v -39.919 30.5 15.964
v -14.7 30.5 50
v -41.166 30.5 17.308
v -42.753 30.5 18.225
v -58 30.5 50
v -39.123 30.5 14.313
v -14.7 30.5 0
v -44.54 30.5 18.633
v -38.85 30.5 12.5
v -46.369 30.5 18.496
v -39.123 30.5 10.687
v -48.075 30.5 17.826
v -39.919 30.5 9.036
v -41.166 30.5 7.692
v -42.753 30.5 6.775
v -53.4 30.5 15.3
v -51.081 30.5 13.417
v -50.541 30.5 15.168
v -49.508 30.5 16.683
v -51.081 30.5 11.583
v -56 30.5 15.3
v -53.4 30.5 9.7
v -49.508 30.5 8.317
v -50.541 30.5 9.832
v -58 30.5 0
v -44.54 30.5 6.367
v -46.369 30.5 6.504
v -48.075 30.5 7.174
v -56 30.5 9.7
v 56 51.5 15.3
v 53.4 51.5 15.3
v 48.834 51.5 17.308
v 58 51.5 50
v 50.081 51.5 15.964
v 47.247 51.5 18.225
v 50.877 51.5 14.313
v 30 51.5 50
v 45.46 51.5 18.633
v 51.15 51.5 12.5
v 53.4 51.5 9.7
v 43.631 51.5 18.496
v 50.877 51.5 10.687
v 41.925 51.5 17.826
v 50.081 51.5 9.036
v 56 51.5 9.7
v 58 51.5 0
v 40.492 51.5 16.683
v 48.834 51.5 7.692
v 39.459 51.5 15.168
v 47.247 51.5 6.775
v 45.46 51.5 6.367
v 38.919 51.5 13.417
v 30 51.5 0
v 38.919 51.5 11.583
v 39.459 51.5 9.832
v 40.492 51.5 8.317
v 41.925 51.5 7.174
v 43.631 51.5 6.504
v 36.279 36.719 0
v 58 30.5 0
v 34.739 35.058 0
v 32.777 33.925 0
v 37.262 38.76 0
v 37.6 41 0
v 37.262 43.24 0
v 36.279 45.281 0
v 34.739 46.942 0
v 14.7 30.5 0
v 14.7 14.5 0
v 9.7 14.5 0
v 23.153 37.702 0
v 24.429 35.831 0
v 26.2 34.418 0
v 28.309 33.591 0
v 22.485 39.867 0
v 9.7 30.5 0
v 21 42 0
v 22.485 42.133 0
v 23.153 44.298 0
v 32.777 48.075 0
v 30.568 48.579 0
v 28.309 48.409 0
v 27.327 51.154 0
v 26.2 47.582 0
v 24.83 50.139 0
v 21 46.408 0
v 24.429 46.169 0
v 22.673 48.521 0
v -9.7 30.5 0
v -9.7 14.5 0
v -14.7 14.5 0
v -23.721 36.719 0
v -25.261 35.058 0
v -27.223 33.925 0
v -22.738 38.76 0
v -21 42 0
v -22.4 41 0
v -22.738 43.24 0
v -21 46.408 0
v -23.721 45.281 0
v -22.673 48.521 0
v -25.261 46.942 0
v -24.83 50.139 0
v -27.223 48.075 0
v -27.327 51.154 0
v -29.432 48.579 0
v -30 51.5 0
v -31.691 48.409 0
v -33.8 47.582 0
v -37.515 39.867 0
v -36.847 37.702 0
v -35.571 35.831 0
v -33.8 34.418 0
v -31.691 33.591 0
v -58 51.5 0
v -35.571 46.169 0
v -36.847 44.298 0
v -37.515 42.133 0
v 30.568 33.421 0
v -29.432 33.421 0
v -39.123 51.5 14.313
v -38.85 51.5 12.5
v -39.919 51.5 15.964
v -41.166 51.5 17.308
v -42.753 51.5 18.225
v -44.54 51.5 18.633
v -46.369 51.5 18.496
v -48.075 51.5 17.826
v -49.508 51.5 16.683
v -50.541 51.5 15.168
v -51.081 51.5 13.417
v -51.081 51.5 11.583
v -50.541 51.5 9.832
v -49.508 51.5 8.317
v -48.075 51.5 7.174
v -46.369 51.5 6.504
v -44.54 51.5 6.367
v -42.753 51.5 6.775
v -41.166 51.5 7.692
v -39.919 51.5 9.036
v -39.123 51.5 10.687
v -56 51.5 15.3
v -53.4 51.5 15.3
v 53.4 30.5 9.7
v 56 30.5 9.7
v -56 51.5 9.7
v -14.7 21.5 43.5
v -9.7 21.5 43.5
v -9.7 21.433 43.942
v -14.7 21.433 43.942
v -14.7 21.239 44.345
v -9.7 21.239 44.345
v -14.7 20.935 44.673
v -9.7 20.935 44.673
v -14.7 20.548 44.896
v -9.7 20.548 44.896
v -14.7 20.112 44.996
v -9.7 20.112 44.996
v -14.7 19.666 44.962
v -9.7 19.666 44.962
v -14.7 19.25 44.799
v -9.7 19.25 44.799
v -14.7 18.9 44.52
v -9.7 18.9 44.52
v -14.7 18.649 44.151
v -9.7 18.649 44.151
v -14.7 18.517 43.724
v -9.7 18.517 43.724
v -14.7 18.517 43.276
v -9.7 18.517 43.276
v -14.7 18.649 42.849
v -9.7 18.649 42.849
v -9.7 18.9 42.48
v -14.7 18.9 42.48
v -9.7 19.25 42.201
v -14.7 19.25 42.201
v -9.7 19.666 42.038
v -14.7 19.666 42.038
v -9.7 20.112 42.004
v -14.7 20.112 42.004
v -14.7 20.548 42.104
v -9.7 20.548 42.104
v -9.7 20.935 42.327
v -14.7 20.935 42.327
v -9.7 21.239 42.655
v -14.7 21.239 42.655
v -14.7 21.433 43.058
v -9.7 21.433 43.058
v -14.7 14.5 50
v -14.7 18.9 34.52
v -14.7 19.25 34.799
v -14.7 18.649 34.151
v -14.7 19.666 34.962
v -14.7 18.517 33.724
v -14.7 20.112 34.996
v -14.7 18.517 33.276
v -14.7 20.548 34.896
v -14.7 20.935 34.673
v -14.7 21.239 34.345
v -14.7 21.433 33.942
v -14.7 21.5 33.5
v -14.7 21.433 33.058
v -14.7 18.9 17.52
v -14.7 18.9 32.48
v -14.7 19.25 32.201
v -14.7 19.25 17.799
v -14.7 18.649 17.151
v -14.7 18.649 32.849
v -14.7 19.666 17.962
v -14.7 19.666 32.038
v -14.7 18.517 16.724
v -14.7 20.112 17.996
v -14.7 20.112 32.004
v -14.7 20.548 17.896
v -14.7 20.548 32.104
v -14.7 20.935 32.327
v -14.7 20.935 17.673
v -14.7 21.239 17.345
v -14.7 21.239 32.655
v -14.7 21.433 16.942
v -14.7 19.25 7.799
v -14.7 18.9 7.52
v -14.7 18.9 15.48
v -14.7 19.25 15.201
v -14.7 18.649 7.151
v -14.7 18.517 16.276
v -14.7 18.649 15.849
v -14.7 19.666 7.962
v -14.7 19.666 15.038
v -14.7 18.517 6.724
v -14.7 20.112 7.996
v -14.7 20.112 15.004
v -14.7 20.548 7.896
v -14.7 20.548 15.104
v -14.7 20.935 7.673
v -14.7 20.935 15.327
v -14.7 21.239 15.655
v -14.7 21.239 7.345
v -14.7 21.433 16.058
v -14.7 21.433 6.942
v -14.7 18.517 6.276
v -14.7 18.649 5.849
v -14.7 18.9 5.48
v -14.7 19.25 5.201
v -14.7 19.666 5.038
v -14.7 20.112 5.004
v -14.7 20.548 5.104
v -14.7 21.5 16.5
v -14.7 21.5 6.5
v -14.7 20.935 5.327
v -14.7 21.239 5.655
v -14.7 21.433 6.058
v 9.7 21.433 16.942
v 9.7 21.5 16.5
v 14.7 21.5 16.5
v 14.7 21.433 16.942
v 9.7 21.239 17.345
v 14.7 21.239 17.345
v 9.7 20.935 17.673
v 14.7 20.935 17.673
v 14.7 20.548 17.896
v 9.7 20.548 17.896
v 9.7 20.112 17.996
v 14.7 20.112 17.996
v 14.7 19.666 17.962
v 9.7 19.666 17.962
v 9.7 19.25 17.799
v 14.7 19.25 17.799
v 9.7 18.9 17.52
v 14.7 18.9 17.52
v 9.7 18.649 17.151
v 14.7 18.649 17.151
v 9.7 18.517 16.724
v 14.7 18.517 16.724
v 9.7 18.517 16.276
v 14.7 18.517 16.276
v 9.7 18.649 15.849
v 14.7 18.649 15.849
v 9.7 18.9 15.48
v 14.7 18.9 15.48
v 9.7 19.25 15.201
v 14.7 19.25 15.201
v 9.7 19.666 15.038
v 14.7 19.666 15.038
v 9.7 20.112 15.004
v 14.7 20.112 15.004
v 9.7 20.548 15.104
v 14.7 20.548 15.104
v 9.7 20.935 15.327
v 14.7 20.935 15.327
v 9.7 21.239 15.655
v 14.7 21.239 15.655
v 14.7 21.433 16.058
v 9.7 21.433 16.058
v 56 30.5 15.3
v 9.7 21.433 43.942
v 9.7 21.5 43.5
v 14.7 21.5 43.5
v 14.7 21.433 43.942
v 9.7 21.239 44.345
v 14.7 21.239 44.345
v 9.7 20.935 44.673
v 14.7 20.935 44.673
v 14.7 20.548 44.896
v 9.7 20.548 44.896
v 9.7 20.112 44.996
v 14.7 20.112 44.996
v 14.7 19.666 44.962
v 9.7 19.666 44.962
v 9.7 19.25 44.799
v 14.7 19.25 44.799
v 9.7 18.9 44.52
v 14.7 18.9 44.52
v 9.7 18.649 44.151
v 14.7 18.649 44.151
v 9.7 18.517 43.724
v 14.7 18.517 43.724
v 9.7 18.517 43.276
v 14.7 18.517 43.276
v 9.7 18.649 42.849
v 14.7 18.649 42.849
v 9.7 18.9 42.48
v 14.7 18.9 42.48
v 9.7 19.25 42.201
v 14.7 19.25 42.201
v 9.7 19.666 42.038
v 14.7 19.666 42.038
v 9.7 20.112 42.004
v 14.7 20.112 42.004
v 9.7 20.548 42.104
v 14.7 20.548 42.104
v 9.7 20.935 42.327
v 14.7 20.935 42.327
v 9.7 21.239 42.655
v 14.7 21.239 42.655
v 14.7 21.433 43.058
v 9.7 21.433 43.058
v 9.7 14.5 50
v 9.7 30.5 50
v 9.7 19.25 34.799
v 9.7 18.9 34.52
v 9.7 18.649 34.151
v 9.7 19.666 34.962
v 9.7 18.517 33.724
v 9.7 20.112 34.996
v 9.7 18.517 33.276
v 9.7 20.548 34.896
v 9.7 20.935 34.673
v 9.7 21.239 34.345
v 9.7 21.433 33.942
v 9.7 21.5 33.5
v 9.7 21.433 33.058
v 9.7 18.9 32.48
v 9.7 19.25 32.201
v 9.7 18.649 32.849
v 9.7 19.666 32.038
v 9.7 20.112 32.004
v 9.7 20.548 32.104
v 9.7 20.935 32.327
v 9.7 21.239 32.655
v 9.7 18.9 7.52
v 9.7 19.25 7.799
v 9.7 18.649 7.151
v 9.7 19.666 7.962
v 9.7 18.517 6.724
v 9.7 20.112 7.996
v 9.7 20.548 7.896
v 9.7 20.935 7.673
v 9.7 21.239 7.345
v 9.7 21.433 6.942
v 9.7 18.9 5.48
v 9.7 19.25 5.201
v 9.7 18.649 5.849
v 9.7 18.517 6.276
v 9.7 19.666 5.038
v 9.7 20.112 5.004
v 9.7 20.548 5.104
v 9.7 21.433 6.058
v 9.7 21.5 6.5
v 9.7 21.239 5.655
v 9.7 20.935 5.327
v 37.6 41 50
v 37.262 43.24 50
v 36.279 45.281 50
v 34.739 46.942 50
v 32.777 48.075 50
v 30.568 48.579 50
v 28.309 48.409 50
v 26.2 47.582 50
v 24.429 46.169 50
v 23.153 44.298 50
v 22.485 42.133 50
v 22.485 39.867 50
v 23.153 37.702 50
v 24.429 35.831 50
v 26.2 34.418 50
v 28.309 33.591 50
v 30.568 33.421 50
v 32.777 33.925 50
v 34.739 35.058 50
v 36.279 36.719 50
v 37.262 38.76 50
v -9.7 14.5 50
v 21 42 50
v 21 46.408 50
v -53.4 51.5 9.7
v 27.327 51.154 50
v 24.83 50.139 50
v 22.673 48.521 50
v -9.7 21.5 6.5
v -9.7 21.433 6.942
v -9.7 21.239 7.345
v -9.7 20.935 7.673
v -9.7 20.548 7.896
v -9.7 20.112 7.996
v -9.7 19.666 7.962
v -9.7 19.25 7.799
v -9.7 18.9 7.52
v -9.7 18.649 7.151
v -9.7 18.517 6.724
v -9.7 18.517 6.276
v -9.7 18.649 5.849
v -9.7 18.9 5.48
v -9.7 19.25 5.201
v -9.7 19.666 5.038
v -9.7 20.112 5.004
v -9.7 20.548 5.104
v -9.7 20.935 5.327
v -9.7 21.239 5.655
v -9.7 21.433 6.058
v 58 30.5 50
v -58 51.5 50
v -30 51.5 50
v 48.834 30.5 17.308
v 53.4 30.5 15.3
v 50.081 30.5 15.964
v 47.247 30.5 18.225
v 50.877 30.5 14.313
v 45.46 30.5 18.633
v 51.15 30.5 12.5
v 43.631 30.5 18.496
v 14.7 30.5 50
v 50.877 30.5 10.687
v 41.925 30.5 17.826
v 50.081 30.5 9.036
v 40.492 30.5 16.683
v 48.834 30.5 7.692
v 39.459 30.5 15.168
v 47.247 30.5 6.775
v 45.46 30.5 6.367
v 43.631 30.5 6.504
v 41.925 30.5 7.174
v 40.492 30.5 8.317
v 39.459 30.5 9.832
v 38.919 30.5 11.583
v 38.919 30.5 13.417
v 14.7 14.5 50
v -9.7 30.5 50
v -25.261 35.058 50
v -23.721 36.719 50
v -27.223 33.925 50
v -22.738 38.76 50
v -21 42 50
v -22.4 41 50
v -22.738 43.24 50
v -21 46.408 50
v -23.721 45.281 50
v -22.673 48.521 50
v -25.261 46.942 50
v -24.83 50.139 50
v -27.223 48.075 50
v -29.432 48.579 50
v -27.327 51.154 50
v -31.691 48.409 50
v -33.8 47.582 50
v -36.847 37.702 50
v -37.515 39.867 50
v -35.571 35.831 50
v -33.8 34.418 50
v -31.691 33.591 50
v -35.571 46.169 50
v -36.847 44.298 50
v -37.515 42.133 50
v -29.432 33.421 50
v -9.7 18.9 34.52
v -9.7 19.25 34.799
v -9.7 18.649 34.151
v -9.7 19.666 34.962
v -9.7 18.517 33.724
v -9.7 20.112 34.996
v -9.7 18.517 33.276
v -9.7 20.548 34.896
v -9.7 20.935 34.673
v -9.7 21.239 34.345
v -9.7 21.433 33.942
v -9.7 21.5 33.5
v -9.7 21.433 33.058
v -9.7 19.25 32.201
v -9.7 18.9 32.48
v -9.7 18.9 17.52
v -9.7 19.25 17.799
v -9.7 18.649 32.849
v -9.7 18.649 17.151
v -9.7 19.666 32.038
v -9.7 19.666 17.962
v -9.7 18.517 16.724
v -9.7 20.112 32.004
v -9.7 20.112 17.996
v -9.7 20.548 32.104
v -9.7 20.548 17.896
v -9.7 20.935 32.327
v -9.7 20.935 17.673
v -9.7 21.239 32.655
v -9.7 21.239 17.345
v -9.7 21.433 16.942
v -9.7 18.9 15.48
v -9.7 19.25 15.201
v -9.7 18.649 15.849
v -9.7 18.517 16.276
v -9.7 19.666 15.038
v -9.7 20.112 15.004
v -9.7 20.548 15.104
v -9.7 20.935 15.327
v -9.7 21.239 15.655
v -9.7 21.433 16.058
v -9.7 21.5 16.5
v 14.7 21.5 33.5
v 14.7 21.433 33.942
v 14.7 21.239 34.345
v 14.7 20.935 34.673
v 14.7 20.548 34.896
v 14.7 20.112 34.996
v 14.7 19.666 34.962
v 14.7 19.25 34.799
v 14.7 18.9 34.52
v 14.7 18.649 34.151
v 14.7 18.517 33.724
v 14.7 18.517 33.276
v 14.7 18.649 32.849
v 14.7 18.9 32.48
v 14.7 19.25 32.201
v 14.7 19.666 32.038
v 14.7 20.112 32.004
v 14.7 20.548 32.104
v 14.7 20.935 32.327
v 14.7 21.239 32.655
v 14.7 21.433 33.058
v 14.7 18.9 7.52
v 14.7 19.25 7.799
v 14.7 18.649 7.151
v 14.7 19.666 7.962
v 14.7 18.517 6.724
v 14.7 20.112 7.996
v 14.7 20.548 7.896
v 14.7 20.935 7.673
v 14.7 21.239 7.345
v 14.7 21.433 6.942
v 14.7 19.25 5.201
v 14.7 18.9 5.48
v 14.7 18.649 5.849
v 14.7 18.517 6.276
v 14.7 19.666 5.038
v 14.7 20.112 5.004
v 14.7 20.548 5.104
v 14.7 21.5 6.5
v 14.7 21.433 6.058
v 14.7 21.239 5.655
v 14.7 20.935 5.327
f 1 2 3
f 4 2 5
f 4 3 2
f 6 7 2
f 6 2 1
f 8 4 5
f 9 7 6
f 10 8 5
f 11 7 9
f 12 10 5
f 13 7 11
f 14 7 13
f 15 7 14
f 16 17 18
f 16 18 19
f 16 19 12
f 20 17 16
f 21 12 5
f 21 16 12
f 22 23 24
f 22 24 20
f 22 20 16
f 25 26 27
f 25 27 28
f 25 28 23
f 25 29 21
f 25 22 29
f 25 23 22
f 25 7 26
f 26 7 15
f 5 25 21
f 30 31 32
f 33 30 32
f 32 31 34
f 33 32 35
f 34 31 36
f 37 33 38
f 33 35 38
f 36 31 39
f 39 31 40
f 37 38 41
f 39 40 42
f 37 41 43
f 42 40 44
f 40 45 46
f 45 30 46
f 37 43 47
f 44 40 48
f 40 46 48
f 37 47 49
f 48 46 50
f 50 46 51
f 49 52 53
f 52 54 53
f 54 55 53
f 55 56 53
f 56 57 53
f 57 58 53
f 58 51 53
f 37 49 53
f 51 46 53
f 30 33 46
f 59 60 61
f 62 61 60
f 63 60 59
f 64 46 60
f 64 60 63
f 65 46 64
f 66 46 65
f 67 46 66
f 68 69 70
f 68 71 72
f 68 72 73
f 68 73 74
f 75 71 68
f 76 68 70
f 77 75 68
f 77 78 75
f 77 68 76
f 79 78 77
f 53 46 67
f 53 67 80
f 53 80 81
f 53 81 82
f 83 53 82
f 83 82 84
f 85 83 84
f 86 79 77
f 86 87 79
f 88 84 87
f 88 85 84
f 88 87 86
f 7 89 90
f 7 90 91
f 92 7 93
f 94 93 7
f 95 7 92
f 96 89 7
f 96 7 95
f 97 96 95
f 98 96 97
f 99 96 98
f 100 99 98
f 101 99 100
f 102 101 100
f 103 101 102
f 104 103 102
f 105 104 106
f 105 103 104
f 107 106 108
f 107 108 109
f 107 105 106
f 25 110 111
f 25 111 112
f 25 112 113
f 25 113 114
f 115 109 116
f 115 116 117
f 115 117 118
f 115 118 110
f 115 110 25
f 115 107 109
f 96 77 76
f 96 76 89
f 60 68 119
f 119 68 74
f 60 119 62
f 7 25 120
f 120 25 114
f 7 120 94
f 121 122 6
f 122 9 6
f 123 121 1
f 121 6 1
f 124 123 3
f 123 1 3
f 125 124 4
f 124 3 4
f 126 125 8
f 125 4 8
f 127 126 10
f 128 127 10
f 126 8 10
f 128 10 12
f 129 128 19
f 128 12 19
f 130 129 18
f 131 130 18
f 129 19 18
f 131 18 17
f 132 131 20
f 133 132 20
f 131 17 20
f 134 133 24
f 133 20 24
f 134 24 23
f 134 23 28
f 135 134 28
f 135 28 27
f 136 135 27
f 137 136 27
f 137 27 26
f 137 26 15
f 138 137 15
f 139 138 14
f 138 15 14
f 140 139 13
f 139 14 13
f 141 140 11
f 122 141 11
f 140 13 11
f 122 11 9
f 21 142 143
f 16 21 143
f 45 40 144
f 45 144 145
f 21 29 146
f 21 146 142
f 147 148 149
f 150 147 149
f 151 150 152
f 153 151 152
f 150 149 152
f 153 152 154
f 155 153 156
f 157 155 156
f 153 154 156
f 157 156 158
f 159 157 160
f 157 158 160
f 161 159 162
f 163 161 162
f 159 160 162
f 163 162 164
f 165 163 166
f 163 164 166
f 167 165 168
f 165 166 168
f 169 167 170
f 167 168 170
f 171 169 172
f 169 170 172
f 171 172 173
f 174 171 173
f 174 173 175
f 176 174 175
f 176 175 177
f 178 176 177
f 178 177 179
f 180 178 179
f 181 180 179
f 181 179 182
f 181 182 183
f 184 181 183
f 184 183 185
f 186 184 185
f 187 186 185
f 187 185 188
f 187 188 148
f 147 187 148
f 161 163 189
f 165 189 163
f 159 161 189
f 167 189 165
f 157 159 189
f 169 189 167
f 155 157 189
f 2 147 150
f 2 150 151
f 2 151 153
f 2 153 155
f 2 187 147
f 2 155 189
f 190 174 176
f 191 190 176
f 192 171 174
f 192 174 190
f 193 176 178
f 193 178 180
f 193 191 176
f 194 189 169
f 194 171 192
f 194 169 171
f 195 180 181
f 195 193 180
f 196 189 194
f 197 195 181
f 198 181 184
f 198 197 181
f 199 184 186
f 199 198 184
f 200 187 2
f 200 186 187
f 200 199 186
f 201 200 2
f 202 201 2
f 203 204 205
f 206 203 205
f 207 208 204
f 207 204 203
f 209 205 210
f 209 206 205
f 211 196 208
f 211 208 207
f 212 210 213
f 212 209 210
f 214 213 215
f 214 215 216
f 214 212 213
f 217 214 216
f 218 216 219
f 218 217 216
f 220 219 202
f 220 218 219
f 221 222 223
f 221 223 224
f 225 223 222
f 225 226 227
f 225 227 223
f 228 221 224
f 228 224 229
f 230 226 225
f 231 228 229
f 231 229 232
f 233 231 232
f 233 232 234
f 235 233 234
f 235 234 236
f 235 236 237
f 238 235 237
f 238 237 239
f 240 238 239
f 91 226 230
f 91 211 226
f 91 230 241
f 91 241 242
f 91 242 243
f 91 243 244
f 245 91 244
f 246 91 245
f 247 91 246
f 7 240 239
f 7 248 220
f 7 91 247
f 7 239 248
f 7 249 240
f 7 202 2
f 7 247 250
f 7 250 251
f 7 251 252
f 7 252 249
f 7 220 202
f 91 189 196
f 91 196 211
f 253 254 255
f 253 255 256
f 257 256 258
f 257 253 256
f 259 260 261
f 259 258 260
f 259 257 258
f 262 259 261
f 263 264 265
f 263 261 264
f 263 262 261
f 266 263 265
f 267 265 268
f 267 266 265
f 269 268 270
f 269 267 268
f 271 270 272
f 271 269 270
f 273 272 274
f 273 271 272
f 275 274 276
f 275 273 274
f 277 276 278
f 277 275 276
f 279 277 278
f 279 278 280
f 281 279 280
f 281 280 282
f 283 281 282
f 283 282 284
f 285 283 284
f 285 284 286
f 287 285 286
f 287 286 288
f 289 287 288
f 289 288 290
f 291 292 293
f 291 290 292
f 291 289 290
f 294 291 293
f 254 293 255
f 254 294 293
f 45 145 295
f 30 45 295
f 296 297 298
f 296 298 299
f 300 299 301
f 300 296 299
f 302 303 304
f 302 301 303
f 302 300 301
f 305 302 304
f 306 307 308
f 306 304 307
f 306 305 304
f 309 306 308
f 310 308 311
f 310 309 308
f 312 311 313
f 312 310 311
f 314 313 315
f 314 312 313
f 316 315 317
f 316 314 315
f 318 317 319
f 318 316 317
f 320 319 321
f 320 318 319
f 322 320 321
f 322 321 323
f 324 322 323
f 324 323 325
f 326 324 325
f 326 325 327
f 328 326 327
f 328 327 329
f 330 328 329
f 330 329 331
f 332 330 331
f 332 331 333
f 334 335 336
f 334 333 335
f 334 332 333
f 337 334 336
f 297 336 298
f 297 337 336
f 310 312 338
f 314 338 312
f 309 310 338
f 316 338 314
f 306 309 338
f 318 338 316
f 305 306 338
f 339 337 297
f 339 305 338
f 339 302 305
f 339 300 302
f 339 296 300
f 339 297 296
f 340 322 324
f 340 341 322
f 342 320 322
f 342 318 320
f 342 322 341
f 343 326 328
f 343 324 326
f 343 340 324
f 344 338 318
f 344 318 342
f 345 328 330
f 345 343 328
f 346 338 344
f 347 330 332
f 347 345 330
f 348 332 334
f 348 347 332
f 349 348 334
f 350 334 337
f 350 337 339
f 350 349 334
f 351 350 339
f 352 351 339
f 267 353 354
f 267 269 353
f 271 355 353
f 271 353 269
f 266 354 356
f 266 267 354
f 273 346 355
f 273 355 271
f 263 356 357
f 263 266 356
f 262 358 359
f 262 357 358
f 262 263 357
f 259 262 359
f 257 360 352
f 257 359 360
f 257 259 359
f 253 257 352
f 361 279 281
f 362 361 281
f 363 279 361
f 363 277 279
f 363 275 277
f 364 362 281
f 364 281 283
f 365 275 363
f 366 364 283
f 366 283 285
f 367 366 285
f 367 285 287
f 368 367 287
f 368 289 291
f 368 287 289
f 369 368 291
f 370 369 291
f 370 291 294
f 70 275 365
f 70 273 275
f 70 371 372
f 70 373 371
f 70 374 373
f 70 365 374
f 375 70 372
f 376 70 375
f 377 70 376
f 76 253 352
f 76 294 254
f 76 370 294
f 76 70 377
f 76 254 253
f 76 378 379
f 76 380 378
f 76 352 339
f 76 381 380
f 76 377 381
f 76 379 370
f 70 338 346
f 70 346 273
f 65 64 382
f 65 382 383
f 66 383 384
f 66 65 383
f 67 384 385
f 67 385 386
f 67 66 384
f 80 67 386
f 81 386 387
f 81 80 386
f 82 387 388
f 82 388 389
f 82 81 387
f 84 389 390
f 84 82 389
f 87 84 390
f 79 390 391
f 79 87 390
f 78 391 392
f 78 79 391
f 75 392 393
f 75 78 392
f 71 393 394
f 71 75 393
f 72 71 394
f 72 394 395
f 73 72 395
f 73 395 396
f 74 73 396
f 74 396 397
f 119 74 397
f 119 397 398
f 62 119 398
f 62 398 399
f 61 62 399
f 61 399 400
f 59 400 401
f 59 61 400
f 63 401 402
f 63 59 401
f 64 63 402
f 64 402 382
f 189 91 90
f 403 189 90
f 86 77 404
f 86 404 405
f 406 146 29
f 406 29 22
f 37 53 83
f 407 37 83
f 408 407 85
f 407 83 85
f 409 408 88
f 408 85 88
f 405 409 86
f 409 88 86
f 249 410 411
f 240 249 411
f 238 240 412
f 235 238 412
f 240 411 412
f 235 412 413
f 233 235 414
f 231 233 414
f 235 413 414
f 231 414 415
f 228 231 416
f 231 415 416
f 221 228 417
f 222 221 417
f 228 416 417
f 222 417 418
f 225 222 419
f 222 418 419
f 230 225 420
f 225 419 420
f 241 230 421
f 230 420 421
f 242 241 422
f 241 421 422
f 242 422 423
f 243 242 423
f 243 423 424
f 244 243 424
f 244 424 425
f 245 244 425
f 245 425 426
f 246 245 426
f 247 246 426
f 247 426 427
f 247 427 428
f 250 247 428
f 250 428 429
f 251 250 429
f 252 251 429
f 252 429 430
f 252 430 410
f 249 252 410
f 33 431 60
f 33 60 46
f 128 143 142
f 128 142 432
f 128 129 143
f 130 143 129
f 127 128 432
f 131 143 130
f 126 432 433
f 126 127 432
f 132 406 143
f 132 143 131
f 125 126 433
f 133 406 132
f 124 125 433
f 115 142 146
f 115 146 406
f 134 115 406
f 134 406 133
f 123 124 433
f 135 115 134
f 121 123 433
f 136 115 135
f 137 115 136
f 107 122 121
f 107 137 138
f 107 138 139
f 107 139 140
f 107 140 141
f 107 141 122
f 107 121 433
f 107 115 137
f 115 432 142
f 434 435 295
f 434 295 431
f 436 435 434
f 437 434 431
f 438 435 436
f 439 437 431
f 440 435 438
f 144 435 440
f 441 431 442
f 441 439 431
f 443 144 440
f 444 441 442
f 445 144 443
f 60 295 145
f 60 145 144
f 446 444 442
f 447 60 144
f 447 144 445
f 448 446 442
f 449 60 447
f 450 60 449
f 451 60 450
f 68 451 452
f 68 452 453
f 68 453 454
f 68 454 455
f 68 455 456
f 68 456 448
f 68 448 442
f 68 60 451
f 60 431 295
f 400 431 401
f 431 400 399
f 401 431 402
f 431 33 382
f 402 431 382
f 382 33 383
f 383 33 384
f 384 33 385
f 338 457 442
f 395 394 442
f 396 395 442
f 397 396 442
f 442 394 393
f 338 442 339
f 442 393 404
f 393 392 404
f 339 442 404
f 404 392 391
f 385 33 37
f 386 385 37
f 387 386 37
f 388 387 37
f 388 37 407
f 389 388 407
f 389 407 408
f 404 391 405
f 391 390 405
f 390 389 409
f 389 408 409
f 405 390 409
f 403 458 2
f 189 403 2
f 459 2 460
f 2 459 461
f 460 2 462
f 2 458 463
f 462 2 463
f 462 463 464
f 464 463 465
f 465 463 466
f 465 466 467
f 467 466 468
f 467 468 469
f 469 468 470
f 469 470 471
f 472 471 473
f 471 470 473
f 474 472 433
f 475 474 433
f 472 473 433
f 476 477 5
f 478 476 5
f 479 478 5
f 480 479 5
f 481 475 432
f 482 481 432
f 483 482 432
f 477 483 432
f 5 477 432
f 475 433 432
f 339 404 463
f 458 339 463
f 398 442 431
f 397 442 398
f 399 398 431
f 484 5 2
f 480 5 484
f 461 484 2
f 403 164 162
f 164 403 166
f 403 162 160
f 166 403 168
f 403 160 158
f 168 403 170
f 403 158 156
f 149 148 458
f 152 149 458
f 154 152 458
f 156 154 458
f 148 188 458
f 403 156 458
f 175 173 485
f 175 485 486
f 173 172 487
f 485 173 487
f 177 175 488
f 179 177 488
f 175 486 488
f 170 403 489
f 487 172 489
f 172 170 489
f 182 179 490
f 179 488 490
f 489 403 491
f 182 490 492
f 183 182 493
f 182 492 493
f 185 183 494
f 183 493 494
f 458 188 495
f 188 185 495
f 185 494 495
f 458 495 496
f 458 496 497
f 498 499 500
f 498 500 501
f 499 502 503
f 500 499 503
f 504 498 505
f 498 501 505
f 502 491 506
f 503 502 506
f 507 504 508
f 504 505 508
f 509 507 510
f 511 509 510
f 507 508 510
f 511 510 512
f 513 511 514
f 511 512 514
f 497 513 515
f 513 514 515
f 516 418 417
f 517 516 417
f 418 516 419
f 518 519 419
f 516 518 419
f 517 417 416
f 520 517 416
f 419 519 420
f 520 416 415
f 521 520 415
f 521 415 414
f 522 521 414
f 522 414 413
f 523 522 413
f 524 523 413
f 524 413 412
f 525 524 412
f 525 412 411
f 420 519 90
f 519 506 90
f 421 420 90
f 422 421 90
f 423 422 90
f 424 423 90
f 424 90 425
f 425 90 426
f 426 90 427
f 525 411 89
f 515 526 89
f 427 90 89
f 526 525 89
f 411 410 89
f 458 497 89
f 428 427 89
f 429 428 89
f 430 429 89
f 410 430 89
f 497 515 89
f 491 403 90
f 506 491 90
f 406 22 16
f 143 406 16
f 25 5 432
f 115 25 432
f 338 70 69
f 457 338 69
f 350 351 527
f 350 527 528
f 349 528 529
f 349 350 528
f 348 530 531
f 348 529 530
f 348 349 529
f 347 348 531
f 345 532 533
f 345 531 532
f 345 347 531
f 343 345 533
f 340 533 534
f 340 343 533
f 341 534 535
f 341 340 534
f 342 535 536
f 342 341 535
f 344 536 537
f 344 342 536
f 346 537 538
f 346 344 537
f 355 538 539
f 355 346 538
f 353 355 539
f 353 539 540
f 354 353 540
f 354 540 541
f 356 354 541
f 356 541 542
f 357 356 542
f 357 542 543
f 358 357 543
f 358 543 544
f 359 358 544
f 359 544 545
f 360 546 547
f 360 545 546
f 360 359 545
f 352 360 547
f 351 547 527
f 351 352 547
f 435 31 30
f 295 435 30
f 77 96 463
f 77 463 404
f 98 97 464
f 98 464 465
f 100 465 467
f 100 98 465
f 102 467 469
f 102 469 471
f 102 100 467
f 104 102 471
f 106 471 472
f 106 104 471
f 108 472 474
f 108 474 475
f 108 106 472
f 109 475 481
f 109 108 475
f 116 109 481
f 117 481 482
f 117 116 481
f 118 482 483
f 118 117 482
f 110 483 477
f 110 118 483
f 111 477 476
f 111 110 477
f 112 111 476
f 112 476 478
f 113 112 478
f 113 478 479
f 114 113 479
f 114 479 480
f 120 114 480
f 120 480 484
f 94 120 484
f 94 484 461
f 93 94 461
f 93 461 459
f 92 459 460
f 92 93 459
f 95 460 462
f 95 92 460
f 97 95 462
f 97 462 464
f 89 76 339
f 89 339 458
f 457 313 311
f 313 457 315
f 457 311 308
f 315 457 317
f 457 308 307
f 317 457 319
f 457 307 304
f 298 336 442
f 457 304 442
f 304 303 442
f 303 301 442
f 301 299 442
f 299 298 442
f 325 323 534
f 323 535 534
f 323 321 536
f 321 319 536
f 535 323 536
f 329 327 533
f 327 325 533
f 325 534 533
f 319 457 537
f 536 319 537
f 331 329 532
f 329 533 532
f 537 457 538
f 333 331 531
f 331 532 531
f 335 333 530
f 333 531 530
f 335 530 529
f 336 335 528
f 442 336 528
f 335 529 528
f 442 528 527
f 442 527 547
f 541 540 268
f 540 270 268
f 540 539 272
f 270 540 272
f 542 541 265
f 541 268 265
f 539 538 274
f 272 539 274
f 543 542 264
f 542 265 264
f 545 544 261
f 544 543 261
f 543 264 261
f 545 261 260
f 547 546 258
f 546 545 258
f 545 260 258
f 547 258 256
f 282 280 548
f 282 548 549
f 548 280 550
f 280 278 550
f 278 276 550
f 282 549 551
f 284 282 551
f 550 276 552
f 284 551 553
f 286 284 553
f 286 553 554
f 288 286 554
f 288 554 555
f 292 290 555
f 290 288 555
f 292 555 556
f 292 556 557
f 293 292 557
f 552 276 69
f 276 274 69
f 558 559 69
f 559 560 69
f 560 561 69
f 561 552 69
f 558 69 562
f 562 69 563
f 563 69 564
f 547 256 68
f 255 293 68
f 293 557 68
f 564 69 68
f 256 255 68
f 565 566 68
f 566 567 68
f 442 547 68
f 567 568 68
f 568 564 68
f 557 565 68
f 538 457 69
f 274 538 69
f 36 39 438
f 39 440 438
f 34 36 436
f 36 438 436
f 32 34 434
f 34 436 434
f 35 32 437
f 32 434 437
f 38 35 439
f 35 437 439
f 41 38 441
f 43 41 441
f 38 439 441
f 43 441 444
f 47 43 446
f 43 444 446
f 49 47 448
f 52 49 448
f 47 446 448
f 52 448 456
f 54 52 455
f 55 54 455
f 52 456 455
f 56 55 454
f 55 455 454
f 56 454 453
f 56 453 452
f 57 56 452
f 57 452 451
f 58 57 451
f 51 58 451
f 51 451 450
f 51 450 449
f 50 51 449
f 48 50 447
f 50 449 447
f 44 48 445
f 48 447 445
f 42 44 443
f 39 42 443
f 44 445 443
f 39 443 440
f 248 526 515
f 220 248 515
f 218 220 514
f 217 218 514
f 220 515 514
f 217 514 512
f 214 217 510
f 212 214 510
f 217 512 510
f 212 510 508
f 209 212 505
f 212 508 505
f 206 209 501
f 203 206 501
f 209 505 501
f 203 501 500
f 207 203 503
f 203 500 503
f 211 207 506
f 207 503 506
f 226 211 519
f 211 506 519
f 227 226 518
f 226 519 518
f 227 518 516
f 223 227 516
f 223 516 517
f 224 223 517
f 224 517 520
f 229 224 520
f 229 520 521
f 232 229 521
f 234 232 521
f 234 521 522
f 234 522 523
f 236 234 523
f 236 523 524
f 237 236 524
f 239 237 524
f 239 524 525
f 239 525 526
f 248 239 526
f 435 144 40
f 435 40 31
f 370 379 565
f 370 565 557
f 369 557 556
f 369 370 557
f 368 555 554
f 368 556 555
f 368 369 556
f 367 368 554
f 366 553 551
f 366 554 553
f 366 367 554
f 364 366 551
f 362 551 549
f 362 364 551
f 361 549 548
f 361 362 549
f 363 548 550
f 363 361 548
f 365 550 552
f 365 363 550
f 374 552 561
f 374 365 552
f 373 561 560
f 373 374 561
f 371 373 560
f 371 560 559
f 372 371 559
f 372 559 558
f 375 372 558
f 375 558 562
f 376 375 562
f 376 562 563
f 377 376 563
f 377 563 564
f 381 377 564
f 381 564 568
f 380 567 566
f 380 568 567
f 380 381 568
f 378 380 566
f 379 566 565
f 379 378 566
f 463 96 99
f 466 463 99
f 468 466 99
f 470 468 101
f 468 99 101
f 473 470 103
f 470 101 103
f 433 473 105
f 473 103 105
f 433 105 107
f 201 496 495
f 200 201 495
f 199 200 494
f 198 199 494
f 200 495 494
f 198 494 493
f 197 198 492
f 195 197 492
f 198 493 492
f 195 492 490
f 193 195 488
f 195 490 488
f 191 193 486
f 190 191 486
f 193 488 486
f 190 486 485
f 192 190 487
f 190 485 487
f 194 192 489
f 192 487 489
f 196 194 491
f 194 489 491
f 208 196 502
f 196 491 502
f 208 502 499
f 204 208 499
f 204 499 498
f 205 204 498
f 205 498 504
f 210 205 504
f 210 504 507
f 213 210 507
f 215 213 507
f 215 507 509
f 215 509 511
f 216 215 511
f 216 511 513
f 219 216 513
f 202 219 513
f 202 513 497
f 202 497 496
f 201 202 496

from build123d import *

# Parameters (mm, degrees)
SKETCH_R             = 7.6
PAD_DEPTH            = 50
SKETCH006_R          = 6.15
SKETCH006_W          = 2.6
SKETCH006_H          = 5.6
POCKET_DEPTH         = 10.501
POCKET_DEPTH_BACK    = 10.501
SKETCH015_W          = 42
SKETCH015_H          = 21
POCKET007_DEPTH      = 50.001
SKETCH022_W          = 5
SKETCH022_H          = 16
PAD010_DEPTH         = 50
SKETCH023_R          = 1.5
POCKET012_DEPTH      = 58.001
POCKET012_DEPTH_BACK = 58.001


with BuildPart() as part:
    # Sketch → Pad (new body)
    with BuildSketch(Plane.XY):
        with BuildLine():
            Line((-19.5477275198, 1), (19.5477275198, 1))
            ThreePointArc((30, 10.5), (22.9377765541, 7.770135134), (19.5477275198, 1))
            Line((58, 10.5), (30, 10.5))
            Line((58, -10.5), (58, 10.5))
            Line((58, -10.5), (-58, -10.5))
            Line((-58, -10.5), (-58, 10.5))
            Line((-58, 10.5), (-30, 10.5))
            ThreePointArc((-19.5477275198, 1), (-22.9377765541, 7.770135134), (-30, 10.5))
        make_face()
        with Locations((-30, 0)):
            Circle(SKETCH_R, mode=Mode.SUBTRACT)
        with Locations((30, 0)):
            Circle(SKETCH_R, mode=Mode.SUBTRACT)
    extrude(amount=PAD_DEPTH)

    # Sketch006 → Pocket (cut, two sides)
    with BuildSketch(Plane.XZ) as pocket_sk:
        with Locations((-45, 12.5)):
            Circle(SKETCH006_R)
        with Locations((45, 12.5)):
            Circle(SKETCH006_R)
        with Locations((-54.7, 12.5)):
            Rectangle(SKETCH006_W, SKETCH006_H)
        with Locations((54.7, 12.5)):
            Rectangle(SKETCH006_W, SKETCH006_H)
    extrude(amount=-POCKET_DEPTH, mode=Mode.SUBTRACT)
    extrude(pocket_sk.sketch, amount=POCKET_DEPTH_BACK, mode=Mode.SUBTRACT)

    # Sketch015 → Pocket007 (cut, through all)
    with BuildSketch(Plane.XY):
        with Locations((0, 11.5)):
            Rectangle(SKETCH015_W, SKETCH015_H)
    extrude(amount=POCKET007_DEPTH, mode=Mode.SUBTRACT)

    # Sketch022 → Pad010 (join)
    with BuildSketch(Plane.XY):
        with Locations((-12.2, -18.5)):
            Rectangle(SKETCH022_W, SKETCH022_H)
        with Locations((12.2, -18.5)):
            Rectangle(SKETCH022_W, SKETCH022_H)
    extrude(amount=PAD010_DEPTH)

    # Sketch023 → Pocket012 (cut, two sides)
    with BuildSketch(Plane.YZ) as pocket012_sk:
        with Locations((-21, 6.5)):
            Circle(SKETCH023_R)
        with Locations((-21, 16.5)):
            Circle(SKETCH023_R)
        with Locations((-21, 33.5)):
            Circle(SKETCH023_R)
        with Locations((-21, 43.5)):
            Circle(SKETCH023_R)
    extrude(amount=-POCKET012_DEPTH, mode=Mode.SUBTRACT)
    extrude(pocket012_sk.sketch, amount=POCKET012_DEPTH_BACK, mode=Mode.SUBTRACT)


with BuildPart() as part_1:
    # Body placement: moved
    add(part.part.moved(Location((0, 41, 0))))


solid = part_1.part
